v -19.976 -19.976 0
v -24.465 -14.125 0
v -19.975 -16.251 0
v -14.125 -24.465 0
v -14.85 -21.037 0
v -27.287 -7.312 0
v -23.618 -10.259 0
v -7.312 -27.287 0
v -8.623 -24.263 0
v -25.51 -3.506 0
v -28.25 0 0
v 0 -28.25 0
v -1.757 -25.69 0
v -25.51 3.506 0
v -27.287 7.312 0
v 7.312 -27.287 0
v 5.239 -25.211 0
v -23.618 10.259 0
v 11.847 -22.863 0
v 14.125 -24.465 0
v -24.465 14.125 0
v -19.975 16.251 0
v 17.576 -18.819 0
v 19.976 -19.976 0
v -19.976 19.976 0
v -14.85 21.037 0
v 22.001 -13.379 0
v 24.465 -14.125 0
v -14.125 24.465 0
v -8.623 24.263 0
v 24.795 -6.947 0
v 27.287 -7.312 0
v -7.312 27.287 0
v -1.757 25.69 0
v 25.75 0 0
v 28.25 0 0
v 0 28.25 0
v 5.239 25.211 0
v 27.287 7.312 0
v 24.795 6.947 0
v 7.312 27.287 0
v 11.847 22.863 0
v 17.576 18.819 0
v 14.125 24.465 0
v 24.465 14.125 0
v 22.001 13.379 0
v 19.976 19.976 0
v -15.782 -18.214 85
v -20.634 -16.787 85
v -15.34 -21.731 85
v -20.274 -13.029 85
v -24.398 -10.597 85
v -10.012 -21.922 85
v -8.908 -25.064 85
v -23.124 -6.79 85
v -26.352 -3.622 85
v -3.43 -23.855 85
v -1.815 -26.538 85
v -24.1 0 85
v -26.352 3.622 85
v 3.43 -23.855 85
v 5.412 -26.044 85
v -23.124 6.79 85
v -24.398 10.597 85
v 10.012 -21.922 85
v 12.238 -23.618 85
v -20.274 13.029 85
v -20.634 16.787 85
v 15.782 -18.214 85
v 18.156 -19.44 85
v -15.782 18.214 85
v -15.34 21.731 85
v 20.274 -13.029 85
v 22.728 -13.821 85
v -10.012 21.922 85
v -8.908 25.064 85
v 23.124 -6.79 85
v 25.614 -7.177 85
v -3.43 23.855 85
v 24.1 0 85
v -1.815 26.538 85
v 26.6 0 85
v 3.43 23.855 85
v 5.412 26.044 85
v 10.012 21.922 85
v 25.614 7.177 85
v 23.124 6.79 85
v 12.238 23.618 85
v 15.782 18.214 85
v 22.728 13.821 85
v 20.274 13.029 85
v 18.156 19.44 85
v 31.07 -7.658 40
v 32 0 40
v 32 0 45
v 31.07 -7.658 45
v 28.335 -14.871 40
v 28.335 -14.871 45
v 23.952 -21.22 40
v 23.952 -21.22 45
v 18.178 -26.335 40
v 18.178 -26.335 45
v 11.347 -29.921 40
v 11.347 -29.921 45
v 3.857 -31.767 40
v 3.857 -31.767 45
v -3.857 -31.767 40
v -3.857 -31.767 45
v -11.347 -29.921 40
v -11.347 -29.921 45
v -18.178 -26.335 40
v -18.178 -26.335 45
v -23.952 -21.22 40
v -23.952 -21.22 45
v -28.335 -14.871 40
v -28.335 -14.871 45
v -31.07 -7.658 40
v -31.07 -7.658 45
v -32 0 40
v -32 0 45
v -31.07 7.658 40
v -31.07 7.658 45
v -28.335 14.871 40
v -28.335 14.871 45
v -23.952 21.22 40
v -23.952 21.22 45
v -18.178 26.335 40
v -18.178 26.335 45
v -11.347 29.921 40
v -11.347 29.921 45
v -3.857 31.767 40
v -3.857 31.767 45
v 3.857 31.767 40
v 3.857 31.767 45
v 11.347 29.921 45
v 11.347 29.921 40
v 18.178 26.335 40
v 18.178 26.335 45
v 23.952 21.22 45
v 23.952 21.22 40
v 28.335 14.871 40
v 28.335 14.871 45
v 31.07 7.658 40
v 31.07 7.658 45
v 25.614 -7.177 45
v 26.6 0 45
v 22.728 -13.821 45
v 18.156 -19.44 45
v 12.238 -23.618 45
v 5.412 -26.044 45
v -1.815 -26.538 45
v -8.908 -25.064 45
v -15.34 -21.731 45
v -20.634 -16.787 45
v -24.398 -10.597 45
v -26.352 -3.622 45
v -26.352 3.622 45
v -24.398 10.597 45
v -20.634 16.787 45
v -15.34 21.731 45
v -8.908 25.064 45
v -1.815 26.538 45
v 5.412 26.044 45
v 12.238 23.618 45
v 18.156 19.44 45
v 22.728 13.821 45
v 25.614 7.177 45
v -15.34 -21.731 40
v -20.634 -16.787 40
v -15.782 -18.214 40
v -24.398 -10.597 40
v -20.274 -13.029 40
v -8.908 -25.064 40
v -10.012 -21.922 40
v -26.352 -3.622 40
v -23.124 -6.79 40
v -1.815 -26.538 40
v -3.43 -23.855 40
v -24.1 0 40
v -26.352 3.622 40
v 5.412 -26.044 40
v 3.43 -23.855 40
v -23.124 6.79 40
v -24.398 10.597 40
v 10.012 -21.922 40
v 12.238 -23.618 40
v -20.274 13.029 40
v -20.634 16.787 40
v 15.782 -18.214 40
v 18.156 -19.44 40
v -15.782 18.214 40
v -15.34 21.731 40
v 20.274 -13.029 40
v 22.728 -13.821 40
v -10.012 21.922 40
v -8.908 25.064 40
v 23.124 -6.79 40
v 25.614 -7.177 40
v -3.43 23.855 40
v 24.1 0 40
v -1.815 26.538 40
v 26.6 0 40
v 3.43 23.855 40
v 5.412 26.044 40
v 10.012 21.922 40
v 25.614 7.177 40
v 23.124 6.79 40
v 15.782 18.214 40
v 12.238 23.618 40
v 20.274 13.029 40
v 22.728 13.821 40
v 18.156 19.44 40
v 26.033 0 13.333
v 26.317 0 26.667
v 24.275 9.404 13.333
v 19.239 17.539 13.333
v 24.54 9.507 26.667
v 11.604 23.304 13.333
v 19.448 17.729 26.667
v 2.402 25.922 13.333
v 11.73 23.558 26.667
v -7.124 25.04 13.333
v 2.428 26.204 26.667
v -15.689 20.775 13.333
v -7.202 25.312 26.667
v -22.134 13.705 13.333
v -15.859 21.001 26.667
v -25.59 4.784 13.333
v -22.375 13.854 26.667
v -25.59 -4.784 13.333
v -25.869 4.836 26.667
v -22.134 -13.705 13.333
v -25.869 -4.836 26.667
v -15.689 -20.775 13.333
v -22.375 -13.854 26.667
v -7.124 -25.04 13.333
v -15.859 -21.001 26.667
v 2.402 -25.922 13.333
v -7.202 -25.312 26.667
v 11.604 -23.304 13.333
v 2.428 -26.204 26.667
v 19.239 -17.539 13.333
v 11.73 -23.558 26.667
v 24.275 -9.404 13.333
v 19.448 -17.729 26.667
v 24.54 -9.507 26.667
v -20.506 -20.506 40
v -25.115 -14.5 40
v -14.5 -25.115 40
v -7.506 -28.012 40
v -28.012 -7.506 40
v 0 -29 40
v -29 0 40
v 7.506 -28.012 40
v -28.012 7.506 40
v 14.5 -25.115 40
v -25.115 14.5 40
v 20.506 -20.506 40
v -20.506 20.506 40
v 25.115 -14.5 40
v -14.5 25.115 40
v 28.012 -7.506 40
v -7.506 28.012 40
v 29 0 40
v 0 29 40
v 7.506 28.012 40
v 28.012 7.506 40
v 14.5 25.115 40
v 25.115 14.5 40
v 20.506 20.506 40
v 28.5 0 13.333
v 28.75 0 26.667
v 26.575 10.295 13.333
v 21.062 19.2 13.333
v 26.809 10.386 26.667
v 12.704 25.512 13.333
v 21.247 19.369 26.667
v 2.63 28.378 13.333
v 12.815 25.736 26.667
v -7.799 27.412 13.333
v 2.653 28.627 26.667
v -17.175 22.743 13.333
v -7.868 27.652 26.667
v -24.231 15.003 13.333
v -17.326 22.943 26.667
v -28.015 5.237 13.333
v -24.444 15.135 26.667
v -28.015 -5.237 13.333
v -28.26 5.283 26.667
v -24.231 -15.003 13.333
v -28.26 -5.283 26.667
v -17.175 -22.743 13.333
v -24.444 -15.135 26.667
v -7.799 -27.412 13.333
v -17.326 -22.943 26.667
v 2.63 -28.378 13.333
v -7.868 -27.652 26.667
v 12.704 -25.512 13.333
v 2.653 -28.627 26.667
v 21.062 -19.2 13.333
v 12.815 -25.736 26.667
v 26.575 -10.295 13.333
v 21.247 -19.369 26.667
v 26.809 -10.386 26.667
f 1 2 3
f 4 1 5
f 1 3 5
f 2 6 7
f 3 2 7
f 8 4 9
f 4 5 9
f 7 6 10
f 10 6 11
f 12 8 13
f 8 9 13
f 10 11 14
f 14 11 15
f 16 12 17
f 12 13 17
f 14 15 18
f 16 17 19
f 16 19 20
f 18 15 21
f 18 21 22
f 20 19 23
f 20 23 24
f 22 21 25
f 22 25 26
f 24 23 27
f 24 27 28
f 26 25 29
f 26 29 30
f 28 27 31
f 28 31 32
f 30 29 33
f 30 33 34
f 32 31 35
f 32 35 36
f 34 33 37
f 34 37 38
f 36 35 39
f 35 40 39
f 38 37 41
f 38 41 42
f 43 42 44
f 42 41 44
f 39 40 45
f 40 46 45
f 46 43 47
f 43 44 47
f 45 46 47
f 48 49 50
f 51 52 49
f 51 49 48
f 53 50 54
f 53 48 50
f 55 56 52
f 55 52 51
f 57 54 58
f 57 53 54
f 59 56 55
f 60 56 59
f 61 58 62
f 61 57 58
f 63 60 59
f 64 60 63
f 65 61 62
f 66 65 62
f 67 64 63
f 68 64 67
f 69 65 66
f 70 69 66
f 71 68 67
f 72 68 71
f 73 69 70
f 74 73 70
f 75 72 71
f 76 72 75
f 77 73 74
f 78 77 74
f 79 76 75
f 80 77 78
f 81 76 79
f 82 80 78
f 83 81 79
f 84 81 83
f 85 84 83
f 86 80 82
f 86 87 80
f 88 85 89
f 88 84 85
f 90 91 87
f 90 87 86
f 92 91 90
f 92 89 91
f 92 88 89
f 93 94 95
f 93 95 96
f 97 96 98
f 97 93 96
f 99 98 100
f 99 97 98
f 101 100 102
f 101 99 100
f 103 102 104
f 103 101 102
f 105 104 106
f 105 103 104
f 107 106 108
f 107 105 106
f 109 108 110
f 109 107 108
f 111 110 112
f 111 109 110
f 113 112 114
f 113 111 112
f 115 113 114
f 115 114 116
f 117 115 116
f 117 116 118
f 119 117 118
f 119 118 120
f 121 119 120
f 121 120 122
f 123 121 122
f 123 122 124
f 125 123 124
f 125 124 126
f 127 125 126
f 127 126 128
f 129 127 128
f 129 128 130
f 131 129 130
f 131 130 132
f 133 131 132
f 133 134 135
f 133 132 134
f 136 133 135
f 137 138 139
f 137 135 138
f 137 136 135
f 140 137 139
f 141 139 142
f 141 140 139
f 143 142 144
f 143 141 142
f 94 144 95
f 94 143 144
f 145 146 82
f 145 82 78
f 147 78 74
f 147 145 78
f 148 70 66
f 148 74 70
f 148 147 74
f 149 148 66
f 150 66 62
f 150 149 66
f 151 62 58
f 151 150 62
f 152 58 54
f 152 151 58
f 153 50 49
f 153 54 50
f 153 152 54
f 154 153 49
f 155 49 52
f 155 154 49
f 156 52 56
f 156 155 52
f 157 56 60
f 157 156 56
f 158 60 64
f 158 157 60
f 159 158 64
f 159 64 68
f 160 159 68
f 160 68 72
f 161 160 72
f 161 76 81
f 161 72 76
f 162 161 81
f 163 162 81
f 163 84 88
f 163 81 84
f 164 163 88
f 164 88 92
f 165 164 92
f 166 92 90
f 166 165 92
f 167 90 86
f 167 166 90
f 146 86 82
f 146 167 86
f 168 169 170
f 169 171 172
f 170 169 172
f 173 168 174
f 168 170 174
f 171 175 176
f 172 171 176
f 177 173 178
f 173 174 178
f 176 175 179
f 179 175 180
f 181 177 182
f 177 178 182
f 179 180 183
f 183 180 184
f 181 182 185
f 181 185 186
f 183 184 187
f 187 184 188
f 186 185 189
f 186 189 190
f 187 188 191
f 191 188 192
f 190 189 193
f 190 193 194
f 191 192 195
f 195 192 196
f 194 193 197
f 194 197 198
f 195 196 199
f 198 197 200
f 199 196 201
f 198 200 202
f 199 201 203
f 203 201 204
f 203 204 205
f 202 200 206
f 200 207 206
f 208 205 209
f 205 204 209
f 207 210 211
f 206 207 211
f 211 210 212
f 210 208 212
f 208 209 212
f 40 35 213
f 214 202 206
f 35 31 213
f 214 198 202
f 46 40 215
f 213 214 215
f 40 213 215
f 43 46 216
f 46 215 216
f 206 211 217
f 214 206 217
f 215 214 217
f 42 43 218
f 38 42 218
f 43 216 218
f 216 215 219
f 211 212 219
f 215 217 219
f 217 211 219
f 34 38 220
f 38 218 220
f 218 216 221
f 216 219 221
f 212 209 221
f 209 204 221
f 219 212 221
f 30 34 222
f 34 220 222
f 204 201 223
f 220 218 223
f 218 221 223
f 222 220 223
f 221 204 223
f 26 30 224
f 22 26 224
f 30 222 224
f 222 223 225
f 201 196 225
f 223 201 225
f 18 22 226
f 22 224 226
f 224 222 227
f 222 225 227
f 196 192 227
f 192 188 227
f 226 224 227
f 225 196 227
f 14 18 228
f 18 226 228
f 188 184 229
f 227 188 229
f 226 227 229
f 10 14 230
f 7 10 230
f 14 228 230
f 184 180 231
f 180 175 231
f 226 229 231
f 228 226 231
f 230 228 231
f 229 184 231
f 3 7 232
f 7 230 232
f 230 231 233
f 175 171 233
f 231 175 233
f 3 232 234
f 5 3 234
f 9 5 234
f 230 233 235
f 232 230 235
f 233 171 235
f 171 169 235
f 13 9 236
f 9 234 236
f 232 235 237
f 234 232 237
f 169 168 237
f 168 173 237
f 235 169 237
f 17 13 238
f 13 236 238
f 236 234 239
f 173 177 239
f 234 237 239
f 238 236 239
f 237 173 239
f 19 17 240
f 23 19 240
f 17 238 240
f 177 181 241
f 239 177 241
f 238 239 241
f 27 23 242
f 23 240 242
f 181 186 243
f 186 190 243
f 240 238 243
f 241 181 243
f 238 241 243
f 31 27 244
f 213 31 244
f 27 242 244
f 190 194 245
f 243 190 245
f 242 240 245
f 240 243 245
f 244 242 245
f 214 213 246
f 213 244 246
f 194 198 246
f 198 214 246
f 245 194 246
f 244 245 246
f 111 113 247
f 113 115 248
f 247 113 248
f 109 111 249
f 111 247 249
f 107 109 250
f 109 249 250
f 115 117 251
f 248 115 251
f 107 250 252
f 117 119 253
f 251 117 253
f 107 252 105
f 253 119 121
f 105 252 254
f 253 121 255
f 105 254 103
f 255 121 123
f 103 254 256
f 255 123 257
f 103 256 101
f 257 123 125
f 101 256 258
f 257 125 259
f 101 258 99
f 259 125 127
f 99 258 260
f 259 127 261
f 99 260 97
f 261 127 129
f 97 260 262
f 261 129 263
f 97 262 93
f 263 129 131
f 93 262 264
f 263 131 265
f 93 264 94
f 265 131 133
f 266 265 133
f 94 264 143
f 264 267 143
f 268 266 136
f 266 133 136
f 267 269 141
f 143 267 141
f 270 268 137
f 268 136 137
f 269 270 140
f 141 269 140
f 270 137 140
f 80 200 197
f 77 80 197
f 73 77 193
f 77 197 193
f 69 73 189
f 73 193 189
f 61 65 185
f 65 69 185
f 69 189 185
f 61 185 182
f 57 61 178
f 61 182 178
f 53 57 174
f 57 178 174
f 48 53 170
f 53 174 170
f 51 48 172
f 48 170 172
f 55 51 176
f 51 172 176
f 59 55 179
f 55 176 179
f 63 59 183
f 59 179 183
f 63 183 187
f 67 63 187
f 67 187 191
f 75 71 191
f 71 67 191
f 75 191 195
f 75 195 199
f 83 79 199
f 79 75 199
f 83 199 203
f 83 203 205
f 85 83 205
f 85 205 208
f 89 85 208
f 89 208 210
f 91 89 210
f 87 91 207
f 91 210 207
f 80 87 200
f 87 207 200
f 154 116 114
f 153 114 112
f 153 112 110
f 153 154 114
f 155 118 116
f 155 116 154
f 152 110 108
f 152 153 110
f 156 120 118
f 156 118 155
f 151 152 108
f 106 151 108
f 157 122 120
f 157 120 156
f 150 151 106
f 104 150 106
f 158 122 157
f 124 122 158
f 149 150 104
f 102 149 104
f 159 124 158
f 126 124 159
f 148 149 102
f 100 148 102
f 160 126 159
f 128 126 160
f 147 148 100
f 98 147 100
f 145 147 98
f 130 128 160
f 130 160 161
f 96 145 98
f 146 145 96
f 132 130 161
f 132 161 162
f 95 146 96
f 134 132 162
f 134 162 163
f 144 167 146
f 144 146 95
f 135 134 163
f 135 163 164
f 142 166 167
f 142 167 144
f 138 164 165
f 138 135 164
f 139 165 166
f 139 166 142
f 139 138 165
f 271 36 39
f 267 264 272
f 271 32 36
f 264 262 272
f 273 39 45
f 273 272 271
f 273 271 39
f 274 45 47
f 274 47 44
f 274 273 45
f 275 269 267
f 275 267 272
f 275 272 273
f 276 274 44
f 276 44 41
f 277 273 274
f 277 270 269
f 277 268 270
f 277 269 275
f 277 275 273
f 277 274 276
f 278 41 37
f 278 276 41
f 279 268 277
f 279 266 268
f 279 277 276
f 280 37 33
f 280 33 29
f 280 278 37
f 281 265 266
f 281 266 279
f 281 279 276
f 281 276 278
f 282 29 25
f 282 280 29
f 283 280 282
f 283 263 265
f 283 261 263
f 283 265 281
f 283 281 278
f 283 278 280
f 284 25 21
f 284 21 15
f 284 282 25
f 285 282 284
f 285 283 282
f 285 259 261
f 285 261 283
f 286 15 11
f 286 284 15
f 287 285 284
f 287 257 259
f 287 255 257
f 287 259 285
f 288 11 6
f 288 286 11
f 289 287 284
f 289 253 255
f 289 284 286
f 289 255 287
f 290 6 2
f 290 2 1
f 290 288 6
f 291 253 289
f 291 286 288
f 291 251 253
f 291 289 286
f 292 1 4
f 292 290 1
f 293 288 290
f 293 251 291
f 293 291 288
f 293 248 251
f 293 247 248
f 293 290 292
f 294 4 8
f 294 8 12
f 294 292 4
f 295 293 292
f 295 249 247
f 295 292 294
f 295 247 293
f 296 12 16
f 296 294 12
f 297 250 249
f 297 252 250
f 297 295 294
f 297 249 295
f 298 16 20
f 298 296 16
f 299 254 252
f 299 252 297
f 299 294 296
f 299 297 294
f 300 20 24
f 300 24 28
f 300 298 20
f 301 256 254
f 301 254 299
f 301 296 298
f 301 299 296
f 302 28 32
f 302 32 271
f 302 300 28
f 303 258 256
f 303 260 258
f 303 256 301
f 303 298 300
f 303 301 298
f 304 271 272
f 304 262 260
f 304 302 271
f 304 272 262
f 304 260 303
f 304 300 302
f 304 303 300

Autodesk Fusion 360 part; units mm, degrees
sketch "Sketch1" plane through (0, 0, 0) normal (0, 0, 1) x (1, 0, 0)
  circle A0 centre (0, 0) radius 28.25
  circle A1 centre (0, 0) radius 25.75
  dimension "d1" = 56.5
  dimension "d7" = 51.5
ref_plane "WorkPlane1" through (0, 0, 40) normal (0, 0, 1) x (1, 0, 0)
sketch "Sketch2" plane through (0, 0, 40) normal (0, 0, 1) x (1, 0, 0)
  circle A0 centre (0, 0) radius 29
  circle A1 centre (0, 0) radius 26.6
  dimension "d6" = 58
  dimension "d8" = 53.2
loft "Loft1" add profiles "Sketch1", "Sketch2" section 1 section 2
loft "Loft2" cut profiles "Sketch2", "Sketch1" section 1 contours A1 section 2 contours A1
sketch "Sketch3" plane through (0, 0, 40) normal (0, 0, 1) x (1, 0, 0)
  circle A0 centre (0, 0) radius 32
  circle A1 centre (0, 0) radius 26.6
  circle A2 centre (0, 0) radius 24.1
  dimension "d9" = 64
  dimension "d10" = 53.2
  dimension "d15" = 48.2
extrude "Extrude1" add sketch "Sketch3" along normal blind 5 contours A0
extrude "Extrude2" add sketch "Sketch3" along normal blind 45 contours A1
